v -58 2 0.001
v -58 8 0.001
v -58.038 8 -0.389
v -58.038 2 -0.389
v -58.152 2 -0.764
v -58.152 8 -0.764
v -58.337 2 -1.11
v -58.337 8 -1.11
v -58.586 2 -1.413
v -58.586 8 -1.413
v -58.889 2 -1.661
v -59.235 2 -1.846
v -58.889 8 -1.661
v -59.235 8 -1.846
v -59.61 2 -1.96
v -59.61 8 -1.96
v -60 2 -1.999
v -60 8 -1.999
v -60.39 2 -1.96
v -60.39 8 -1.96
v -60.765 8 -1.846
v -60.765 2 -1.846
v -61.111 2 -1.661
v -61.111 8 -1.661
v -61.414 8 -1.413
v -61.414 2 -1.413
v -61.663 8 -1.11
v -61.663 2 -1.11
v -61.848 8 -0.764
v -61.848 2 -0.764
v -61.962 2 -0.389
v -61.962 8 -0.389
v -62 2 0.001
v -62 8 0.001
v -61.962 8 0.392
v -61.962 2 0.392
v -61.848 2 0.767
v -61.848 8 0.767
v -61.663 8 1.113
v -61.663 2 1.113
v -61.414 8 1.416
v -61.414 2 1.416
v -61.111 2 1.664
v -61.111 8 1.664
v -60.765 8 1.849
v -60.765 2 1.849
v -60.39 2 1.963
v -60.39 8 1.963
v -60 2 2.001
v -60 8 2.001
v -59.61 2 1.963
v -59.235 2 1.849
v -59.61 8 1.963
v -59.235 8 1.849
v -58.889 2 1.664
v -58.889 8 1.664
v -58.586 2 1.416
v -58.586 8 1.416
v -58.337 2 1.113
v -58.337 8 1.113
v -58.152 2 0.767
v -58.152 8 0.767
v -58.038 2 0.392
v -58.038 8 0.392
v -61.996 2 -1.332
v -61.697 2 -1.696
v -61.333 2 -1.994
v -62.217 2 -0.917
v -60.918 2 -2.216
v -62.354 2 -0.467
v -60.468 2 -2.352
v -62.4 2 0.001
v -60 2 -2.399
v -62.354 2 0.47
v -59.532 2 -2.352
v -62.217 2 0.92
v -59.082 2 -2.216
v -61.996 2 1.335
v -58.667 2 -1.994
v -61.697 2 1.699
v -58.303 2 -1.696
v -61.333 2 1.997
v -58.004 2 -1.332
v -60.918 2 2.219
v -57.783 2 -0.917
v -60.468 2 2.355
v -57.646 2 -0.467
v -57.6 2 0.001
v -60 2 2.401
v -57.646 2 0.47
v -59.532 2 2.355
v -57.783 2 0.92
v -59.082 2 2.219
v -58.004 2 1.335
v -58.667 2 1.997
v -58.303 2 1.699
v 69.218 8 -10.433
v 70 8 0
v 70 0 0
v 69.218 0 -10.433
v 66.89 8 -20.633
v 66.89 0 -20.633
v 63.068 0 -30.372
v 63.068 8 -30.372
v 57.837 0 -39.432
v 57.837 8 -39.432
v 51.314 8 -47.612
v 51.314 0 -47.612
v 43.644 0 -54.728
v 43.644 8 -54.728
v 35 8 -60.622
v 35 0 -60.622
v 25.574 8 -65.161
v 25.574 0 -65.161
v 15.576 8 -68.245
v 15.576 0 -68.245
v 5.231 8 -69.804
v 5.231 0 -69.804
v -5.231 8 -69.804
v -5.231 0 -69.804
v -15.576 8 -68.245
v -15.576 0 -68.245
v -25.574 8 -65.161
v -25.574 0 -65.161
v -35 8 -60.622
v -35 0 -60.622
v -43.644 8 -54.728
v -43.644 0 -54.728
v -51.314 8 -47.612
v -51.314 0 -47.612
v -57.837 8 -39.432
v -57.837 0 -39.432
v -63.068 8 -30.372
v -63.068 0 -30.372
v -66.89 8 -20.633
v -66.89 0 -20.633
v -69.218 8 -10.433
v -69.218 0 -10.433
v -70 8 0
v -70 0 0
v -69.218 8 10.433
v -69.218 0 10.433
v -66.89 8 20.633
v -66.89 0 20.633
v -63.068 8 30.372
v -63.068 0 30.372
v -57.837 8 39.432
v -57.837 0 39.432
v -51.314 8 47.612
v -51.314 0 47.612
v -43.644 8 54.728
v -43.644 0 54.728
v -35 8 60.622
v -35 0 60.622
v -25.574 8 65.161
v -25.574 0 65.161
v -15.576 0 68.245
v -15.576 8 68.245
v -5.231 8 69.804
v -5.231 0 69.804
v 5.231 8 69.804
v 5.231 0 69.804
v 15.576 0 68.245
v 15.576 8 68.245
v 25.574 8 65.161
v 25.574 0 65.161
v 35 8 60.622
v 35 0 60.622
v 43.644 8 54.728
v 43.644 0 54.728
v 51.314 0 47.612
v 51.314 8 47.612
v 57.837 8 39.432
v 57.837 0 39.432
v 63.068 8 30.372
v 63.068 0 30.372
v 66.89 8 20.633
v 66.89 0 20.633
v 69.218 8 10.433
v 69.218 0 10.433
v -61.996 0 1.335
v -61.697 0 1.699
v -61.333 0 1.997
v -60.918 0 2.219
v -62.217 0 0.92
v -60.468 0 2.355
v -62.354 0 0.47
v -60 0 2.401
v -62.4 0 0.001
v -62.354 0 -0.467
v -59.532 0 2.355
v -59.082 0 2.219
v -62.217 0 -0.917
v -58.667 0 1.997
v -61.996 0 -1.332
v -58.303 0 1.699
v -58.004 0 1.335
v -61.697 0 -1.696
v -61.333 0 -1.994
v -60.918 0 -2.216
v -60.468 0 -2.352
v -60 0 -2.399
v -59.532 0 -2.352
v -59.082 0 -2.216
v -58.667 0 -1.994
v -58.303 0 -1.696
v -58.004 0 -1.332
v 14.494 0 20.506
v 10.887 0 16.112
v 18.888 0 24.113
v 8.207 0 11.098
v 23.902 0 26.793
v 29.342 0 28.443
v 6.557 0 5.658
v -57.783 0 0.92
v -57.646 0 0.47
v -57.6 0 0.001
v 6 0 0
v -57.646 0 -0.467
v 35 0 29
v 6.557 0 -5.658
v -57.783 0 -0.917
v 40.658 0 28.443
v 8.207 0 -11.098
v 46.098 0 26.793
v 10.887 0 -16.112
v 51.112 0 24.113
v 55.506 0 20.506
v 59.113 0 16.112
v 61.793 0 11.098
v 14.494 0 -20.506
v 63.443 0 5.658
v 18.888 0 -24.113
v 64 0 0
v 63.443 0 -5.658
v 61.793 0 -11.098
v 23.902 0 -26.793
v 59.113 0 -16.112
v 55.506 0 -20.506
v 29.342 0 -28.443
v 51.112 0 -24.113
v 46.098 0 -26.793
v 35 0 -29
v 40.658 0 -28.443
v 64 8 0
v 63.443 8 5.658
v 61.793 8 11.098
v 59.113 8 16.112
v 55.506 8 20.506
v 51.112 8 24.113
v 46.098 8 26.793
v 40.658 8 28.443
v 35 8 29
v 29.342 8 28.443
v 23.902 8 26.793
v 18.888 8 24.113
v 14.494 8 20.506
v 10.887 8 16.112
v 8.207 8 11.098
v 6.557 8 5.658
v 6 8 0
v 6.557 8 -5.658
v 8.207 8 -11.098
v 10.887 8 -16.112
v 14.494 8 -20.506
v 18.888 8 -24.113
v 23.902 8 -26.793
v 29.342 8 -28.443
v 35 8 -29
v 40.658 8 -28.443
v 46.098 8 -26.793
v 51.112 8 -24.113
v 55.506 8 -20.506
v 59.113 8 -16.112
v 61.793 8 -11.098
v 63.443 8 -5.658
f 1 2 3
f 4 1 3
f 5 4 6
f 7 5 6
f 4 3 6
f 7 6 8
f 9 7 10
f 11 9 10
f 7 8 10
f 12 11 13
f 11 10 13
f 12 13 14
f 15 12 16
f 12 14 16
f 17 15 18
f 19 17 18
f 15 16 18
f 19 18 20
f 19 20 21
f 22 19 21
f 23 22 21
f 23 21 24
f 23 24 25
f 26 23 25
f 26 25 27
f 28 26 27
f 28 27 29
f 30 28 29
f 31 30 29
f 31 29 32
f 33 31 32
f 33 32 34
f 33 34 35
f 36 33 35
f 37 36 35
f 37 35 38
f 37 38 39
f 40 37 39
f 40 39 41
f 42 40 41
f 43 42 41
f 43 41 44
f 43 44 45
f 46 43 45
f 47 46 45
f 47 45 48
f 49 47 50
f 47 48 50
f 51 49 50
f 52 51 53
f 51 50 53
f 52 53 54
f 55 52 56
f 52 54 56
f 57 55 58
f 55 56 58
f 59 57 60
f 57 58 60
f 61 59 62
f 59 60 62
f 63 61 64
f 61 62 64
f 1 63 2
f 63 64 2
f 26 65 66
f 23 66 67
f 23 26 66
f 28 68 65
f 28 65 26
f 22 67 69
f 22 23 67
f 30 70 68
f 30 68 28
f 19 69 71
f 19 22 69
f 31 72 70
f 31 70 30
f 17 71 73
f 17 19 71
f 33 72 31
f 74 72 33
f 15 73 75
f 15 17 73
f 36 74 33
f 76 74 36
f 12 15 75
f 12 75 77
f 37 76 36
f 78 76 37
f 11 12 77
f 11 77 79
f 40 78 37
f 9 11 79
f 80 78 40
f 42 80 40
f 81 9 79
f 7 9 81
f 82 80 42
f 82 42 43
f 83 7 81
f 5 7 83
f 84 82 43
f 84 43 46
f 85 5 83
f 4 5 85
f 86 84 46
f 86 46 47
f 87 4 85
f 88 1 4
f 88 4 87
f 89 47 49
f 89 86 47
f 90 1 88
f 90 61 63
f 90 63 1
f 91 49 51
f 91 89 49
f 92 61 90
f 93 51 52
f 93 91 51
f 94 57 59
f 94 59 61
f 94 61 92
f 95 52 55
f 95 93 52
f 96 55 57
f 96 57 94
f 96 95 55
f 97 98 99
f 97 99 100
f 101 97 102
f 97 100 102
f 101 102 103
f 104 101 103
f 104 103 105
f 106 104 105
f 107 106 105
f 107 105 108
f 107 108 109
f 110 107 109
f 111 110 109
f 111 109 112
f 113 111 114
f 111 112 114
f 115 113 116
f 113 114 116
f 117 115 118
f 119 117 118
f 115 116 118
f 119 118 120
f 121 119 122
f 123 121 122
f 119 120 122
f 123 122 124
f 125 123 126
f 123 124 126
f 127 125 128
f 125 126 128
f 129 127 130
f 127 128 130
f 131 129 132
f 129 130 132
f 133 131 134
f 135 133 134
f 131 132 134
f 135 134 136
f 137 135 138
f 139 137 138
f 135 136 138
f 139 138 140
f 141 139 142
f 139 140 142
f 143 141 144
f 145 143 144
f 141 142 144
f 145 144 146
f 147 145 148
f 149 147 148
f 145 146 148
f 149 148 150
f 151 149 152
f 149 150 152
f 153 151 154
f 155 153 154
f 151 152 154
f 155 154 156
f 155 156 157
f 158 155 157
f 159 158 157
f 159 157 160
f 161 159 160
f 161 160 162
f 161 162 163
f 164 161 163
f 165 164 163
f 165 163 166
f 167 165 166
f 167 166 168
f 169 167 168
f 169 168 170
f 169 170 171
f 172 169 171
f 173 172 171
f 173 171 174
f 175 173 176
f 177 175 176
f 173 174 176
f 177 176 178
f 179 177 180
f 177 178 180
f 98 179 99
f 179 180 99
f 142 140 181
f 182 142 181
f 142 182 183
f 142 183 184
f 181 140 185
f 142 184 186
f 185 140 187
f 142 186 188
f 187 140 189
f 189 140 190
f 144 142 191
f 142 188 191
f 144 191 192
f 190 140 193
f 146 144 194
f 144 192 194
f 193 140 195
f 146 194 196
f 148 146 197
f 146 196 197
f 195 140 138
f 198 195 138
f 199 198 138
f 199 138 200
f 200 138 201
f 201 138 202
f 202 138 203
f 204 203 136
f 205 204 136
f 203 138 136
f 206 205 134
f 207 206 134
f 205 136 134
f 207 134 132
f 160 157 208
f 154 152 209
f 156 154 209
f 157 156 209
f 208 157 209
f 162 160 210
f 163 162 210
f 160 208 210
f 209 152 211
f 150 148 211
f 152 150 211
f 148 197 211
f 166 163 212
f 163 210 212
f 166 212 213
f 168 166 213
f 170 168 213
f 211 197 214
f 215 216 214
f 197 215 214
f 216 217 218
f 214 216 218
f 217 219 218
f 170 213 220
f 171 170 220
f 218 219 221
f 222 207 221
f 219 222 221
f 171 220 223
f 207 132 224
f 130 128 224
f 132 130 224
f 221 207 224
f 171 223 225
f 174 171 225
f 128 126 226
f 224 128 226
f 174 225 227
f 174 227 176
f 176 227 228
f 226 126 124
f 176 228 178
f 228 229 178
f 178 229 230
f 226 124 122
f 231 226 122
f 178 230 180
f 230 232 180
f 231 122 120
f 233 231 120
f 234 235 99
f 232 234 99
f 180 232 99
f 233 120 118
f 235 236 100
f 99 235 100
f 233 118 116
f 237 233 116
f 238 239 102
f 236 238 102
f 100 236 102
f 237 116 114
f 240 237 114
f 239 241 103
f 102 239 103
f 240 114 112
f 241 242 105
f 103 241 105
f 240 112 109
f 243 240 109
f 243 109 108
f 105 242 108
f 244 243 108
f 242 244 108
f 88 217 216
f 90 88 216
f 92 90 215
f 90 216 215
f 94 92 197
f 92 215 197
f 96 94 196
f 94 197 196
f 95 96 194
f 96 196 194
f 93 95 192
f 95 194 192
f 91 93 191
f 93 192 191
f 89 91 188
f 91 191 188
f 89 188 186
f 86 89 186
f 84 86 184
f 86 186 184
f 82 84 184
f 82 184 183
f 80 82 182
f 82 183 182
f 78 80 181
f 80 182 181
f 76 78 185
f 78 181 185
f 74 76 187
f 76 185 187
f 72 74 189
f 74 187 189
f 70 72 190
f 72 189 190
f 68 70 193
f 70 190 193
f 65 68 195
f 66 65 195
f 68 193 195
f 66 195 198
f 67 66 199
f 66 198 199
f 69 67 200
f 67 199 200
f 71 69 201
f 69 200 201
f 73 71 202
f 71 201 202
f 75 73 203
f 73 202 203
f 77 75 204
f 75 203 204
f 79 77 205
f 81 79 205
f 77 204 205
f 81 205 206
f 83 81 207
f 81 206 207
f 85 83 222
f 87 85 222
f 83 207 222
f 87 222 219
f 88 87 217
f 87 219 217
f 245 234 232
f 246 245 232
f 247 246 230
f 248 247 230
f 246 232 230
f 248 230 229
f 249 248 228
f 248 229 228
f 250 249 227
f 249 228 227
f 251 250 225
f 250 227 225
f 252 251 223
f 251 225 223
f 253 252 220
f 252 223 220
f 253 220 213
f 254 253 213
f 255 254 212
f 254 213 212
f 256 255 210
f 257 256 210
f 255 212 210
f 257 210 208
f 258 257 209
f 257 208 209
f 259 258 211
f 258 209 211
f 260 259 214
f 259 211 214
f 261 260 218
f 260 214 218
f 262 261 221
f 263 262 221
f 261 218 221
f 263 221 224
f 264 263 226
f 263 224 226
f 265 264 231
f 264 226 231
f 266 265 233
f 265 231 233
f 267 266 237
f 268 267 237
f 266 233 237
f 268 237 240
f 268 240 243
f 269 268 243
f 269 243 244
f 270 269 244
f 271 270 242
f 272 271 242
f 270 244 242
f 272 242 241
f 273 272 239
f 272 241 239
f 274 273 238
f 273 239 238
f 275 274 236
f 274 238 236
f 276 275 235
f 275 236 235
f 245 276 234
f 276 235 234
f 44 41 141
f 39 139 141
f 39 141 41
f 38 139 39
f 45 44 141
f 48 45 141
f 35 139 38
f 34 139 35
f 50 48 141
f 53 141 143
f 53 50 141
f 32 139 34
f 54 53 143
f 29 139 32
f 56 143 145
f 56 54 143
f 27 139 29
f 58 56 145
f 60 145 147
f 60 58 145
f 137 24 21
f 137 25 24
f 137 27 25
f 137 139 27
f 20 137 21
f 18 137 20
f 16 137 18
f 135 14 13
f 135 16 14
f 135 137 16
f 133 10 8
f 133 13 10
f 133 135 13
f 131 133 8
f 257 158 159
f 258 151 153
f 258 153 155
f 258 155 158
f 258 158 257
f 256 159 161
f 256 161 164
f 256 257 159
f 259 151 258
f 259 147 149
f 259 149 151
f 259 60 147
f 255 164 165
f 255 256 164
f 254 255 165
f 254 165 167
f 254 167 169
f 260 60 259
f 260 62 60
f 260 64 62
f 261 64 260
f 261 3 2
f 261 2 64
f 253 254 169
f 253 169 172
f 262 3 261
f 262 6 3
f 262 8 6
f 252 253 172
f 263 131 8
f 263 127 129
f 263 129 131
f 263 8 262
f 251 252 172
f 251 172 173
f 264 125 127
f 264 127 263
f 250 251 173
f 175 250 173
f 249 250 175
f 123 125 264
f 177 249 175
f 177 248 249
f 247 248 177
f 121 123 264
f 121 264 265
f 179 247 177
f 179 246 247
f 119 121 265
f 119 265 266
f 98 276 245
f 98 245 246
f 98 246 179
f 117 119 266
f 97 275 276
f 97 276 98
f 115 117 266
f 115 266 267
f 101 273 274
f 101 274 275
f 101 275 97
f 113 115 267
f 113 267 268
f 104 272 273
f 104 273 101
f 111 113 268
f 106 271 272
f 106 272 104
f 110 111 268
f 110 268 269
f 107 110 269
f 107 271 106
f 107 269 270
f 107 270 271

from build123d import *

# Parameters (mm, degrees)
SKETCH1_R           = 70
BOSS_EXTRUDE1_DEPTH = 8
CUT_EXTRUDE1_REACH  = 10
SKETCH2_R           = 2
SKETCH3_R           = 2.4
CUT_EXTRUDE2_DEPTH  = 2


with BuildPart() as part:
    # Sketch1 → Boss-Extrude1 (new body)
    with BuildSketch(Plane(origin=(0, 0, 0), x_dir=(1, 0, 0), z_dir=(0, 1, 0))):
        Circle(SKETCH1_R)
        with BuildLine():
            ThreePointArc((35, -29), (6, 0), (35, 29))
            ThreePointArc((35, 29), (55.506096654, 20.506096654), (64, 0))
            ThreePointArc((64, 0), (55.506096654, -20.506096654), (35, -29))
        make_face(mode=Mode.SUBTRACT)
    extrude(amount=BOSS_EXTRUDE1_DEPTH)

    # Sketch2 → Cut-Extrude1 (cut, up to next)
    with BuildSketch(Plane(origin=(0, 8, 0), x_dir=(1, 0, 0), z_dir=(0, 1, 0)), mode=Mode.PRIVATE) as cut_extrude1_sk1:
        with Locations((-59.999999981, -0.001490332)):
            Circle(SKETCH2_R)
    cut_extrude1_tool1 = extrude(cut_extrude1_sk1.sketch, amount=-CUT_EXTRUDE1_REACH, mode=Mode.PRIVATE) & part.part
    add(cut_extrude1_tool1.solids().sort_by_distance((-60, 8, 0.00149))[0], mode=Mode.SUBTRACT)

    # Sketch3 → Cut-Extrude2 (cut)
    with BuildSketch(Plane.XZ):
        with Locations((-59.999999981, 0.001490332)):
            Circle(SKETCH3_R)
    extrude(amount=-CUT_EXTRUDE2_DEPTH, mode=Mode.SUBTRACT)


solid = part.part
